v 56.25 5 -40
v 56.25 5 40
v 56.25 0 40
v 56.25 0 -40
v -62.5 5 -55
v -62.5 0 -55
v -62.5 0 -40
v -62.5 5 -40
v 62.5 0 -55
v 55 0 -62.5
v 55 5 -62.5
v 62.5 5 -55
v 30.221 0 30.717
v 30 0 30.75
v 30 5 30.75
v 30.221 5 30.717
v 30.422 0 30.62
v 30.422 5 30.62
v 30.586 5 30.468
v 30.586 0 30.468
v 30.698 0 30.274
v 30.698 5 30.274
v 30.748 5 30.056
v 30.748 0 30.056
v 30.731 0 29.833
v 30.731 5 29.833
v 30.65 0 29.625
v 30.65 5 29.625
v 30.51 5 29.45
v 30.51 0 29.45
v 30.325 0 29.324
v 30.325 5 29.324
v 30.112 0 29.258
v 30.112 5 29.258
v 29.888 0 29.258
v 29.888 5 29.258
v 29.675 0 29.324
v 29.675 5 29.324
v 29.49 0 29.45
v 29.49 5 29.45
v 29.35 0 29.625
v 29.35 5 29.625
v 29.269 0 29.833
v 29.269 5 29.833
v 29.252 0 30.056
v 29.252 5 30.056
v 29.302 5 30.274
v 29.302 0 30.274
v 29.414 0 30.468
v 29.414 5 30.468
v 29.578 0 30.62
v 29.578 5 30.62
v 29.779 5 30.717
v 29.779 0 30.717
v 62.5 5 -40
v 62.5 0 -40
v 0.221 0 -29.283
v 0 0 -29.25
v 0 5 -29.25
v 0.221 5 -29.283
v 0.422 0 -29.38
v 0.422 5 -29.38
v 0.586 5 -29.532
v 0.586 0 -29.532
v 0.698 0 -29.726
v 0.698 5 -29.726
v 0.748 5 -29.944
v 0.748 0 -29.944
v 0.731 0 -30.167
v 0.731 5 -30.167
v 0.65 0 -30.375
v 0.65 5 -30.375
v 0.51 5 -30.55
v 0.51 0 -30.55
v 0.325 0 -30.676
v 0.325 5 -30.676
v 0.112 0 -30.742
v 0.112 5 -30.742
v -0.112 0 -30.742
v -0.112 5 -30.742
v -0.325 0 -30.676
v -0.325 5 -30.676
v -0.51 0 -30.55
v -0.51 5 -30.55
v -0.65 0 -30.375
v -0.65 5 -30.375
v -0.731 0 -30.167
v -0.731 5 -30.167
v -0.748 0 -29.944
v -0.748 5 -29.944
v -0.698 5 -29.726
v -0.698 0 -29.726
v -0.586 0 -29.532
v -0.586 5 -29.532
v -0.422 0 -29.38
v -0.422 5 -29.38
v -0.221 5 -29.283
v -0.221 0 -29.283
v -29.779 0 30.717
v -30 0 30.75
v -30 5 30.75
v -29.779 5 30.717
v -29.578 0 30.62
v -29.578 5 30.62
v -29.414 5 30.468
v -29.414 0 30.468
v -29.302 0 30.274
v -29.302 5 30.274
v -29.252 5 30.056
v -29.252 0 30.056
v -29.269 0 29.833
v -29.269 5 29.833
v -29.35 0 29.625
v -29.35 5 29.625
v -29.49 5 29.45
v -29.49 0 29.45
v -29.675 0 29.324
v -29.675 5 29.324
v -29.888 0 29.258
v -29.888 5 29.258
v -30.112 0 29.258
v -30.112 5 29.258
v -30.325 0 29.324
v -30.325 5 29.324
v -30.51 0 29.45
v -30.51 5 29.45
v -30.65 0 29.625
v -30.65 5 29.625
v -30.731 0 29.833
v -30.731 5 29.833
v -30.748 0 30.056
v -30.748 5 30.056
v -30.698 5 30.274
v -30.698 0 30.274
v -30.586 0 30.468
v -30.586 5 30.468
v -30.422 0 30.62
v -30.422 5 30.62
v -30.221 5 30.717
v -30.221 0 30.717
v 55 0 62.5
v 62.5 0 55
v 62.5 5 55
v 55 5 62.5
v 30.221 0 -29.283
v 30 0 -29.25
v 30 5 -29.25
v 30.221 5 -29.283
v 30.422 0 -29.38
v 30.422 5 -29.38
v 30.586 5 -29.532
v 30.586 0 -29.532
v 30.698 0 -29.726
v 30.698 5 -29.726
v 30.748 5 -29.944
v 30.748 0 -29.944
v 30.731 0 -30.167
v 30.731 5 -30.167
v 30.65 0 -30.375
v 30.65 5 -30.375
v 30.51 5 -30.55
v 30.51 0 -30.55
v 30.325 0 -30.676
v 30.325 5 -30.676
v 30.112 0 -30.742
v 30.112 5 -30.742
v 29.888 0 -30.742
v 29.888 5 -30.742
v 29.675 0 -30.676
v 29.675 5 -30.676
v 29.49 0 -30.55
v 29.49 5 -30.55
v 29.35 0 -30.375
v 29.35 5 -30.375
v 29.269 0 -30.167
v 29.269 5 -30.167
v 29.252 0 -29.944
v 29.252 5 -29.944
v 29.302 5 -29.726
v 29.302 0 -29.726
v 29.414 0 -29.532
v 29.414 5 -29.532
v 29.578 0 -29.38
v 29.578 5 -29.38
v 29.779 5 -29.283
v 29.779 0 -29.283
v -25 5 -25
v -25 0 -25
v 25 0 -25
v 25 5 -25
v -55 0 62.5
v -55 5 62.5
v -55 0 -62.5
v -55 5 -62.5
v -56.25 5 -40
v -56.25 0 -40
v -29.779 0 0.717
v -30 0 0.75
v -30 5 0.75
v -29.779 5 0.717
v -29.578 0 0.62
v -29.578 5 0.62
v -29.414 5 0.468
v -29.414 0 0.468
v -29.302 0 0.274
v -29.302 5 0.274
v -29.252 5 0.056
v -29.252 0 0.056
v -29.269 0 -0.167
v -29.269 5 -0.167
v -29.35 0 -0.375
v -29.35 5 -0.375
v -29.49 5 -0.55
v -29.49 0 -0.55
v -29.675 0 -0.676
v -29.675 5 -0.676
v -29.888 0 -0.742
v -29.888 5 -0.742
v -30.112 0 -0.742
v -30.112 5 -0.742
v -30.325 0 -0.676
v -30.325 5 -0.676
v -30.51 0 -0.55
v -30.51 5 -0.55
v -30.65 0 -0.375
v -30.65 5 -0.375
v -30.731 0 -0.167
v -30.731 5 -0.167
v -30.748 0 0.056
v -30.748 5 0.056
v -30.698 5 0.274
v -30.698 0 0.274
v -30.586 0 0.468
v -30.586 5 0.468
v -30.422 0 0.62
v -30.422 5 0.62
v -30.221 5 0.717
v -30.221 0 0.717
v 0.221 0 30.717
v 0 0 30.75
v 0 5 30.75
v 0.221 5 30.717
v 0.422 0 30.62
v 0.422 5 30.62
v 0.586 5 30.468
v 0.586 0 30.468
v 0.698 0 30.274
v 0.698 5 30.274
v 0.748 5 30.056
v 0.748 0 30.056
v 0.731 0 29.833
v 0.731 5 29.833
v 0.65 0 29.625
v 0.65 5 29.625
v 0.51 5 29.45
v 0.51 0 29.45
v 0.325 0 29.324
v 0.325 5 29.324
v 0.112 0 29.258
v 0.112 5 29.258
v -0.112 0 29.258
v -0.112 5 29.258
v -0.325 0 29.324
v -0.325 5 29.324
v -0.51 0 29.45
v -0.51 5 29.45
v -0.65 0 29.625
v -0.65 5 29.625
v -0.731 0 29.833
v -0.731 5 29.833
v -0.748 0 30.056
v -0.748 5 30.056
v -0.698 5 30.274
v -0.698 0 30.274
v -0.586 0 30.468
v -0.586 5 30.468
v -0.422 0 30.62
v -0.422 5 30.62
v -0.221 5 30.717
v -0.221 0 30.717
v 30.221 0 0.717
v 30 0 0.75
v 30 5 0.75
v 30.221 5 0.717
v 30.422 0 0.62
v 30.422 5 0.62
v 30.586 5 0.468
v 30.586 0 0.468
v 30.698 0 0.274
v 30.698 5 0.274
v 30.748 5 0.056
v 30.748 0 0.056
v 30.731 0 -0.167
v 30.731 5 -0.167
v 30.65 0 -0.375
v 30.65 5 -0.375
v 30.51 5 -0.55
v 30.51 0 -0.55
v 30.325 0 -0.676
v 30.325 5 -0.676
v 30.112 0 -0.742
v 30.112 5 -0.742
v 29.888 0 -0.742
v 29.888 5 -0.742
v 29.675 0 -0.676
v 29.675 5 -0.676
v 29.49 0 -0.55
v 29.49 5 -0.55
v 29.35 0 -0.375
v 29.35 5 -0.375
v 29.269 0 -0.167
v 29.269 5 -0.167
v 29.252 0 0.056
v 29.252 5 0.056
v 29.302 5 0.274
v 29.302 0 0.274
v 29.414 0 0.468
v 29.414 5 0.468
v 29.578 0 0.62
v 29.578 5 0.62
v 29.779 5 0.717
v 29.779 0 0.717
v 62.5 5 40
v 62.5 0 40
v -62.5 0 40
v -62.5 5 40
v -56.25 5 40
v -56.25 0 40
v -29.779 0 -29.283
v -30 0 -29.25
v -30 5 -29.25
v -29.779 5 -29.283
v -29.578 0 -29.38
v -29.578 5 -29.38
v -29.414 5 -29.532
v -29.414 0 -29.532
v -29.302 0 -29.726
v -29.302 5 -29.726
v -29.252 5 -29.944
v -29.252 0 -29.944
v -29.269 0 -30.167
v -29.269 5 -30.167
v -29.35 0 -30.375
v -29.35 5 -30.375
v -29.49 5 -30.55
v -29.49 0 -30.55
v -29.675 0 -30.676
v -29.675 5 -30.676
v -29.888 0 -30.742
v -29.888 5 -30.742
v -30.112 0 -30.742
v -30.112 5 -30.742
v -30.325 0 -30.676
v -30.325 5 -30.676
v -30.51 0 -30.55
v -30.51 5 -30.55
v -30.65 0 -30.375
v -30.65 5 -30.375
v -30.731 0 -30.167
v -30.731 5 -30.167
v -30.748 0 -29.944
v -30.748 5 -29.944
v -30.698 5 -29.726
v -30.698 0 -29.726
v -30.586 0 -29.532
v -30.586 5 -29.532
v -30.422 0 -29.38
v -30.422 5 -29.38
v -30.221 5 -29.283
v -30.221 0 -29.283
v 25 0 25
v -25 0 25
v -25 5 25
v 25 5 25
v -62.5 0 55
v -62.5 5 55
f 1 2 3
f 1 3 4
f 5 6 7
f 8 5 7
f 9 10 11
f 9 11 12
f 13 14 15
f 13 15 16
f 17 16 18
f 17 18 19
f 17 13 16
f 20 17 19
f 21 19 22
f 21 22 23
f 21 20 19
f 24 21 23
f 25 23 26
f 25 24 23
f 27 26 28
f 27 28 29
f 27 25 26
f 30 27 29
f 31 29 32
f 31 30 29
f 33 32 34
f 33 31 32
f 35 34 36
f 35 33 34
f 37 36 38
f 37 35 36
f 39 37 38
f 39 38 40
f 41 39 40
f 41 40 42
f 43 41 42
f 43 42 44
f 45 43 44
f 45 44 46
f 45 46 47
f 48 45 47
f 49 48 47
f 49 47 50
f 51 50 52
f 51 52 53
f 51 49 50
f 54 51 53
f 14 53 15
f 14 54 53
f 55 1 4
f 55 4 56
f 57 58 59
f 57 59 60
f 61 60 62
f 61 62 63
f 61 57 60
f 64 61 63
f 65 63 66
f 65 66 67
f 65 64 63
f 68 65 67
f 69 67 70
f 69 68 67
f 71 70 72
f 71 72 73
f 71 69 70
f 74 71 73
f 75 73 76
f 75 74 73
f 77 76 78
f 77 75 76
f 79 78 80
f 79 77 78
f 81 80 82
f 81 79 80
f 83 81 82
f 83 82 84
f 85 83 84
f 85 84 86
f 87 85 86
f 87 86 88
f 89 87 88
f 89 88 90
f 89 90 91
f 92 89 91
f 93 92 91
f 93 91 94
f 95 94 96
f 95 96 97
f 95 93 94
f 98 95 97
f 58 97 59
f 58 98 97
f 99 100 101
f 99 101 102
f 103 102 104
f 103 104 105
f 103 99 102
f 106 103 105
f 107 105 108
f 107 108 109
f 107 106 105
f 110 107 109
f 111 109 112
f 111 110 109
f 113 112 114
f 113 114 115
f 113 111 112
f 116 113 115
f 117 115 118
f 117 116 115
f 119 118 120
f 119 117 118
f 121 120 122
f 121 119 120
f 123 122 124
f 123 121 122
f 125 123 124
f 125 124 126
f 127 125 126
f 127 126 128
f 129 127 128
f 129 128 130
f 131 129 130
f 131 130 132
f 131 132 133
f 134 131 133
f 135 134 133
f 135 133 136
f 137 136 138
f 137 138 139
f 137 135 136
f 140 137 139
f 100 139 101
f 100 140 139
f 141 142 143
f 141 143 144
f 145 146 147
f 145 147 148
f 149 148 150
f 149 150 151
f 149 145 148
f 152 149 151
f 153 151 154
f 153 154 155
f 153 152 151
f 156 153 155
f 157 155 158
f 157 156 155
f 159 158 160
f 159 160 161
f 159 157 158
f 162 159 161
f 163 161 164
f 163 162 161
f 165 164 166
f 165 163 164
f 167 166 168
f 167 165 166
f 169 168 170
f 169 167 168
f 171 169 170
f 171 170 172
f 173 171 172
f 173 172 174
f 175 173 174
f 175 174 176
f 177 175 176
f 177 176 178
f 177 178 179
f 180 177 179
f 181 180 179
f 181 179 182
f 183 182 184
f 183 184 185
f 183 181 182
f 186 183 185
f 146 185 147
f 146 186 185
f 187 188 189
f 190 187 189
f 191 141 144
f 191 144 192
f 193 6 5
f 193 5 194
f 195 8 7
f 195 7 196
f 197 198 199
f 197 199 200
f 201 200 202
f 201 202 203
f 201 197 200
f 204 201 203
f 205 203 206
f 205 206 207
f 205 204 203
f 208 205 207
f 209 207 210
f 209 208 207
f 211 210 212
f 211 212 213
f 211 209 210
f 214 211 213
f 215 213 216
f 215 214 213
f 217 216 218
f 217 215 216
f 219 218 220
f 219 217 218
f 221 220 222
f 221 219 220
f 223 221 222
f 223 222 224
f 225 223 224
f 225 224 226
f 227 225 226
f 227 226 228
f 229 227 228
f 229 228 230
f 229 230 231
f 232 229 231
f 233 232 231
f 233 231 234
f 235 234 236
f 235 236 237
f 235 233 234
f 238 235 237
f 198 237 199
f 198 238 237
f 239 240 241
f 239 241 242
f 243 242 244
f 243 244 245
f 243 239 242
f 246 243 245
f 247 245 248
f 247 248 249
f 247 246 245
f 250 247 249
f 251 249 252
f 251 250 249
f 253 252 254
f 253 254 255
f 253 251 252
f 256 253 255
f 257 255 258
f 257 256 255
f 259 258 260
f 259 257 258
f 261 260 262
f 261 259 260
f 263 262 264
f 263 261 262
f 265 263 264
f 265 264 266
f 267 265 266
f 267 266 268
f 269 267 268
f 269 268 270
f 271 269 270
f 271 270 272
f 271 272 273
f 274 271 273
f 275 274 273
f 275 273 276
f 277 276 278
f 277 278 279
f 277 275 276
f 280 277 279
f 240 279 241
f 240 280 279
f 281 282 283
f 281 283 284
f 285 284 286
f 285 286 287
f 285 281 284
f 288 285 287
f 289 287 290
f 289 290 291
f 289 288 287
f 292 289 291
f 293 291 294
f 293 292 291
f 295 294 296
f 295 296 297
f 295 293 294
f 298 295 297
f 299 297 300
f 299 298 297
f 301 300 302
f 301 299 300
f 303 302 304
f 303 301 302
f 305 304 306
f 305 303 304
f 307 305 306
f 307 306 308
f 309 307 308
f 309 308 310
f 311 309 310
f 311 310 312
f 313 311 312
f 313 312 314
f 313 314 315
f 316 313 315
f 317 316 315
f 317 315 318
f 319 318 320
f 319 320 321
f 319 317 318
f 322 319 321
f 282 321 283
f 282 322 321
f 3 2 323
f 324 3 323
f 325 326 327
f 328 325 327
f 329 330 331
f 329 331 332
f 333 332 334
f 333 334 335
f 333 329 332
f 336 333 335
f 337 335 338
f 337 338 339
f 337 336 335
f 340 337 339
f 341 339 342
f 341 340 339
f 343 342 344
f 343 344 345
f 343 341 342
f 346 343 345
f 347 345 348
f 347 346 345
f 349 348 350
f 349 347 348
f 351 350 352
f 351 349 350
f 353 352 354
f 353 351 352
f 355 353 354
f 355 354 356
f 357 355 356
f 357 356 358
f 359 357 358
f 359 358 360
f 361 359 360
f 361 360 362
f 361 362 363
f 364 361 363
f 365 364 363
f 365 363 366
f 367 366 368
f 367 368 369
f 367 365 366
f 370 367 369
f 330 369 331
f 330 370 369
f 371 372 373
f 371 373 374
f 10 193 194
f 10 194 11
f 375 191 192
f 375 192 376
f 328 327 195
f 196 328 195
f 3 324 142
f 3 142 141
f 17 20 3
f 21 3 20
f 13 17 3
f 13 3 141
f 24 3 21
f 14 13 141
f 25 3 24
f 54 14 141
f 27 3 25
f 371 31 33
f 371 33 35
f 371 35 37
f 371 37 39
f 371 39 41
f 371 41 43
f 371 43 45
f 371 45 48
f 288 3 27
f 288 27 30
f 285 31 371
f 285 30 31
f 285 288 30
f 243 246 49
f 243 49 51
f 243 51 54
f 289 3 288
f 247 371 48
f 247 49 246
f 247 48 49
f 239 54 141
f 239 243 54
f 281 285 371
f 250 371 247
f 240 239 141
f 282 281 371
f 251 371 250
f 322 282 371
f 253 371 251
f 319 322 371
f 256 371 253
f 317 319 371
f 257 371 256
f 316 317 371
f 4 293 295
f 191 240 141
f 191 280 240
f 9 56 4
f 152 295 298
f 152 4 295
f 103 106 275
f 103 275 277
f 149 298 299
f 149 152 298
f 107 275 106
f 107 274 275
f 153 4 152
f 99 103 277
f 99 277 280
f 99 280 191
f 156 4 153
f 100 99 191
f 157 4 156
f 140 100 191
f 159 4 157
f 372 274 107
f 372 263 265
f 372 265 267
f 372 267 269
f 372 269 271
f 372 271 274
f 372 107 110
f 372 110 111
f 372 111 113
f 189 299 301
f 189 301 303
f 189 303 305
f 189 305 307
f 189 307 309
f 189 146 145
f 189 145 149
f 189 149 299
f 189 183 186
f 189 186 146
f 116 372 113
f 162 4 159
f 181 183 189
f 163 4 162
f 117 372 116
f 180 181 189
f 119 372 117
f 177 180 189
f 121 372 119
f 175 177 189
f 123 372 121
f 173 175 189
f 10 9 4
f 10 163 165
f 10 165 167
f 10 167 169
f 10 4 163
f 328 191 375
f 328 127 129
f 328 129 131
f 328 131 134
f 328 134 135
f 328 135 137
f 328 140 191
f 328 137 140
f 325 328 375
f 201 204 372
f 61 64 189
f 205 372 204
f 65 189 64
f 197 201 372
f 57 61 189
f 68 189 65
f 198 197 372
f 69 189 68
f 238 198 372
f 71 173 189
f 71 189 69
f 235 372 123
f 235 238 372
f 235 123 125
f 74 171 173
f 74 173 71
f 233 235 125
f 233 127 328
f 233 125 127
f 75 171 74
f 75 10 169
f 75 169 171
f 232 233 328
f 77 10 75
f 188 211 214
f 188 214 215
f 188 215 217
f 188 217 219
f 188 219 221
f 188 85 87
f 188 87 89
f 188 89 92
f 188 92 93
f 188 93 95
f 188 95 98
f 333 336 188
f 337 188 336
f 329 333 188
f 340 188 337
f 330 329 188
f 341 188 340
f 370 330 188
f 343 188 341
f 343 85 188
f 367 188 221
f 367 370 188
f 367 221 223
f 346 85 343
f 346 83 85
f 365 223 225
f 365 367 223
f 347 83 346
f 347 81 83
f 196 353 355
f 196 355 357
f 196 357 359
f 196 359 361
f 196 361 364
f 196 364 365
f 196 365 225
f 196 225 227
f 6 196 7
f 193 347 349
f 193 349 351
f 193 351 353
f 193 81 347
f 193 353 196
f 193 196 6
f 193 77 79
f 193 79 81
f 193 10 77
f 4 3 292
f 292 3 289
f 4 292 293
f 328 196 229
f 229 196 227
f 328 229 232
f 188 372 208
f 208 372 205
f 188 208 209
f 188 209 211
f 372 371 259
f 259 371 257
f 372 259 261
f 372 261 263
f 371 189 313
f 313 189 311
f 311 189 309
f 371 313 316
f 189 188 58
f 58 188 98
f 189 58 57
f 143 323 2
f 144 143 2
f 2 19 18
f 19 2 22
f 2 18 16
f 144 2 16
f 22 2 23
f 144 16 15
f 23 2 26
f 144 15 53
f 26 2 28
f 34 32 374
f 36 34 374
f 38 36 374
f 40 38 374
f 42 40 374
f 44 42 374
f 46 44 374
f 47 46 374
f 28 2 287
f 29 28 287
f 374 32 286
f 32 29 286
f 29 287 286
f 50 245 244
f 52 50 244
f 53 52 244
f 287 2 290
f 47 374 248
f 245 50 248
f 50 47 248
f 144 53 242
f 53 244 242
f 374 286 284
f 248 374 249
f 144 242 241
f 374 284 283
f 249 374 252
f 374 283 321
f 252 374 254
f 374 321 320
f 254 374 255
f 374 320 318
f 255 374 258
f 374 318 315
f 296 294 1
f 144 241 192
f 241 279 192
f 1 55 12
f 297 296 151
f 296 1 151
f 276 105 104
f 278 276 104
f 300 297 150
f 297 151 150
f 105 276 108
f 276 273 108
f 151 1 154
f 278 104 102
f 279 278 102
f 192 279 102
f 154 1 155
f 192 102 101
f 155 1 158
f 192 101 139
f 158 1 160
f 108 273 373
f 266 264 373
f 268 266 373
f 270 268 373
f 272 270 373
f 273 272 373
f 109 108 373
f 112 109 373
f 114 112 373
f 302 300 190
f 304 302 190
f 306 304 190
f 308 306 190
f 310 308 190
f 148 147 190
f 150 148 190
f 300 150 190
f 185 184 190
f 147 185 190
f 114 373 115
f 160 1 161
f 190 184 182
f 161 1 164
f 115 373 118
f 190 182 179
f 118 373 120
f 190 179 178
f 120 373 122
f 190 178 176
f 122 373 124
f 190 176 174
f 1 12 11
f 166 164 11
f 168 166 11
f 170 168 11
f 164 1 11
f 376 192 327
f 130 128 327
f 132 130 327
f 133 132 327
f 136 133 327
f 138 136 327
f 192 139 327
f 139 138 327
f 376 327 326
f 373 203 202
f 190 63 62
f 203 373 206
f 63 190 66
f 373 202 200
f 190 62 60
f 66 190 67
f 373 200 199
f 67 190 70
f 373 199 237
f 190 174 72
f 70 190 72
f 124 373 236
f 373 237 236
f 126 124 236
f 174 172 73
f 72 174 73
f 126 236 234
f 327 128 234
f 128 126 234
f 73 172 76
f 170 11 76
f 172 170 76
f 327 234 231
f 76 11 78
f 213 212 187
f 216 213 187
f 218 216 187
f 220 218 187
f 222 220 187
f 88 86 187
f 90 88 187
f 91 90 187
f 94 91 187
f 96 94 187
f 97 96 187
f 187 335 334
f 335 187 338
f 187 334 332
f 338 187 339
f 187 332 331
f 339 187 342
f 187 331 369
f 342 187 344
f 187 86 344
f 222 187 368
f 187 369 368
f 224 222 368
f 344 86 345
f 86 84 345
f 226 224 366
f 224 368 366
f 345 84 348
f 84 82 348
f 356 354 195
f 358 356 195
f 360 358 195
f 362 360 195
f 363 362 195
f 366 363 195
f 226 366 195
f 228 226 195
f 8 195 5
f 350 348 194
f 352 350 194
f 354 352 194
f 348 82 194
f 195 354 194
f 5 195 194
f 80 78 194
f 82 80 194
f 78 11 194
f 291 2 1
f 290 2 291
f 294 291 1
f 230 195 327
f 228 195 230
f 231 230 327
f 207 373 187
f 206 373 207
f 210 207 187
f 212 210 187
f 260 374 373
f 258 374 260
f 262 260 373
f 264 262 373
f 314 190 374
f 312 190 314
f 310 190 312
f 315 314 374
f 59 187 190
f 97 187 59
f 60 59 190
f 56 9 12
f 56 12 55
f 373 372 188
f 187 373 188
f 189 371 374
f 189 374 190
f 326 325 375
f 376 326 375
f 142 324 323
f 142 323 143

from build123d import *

# Parameters (mm, degrees)
CROQUIS2_R              = 0.75
CROQUIS2_W              = 50
CROQUIS2_H              = 50
SALIENTE_EXTRUIR1_DEPTH = 5
CROQUIS3_W              = 6.25
CROQUIS3_H              = 80
CORTAR_EXTRUIR1_DEPTH   = 5


with BuildPart() as part:
    # Croquis2 → Saliente-Extruir1 (new body)
    with BuildSketch(Plane(origin=(0, 0, 0), x_dir=(1, 0, 0), z_dir=(0, 1, 0))):
        Polygon((-62.5, 0), (-62.5, 55), (-55, 62.5), (55, 62.5), (62.5, 55), (62.5, -55), (55, -62.5), (-55, -62.5), (-62.5, -55), align=None)
        with Locations(Location((30, 30, 0), (0, 0, 270))):
            Circle(CROQUIS2_R, mode=Mode.SUBTRACT)
        with Locations(Location((30, 0, 0), (0, 0, 270))):
            Circle(CROQUIS2_R, mode=Mode.SUBTRACT)
        with Locations(Location((30, -30, 0), (0, 0, 270))):
            Circle(CROQUIS2_R, mode=Mode.SUBTRACT)
        with Locations(Location((-30, -30, 0), (0, 0, 270))):
            Circle(CROQUIS2_R, mode=Mode.SUBTRACT)
        with Locations(Location((0, -30, 0), (0, 0, 270))):
            Circle(CROQUIS2_R, mode=Mode.SUBTRACT)
        with Locations(Location((-30, 0, 0), (0, 0, 270))):
            Circle(CROQUIS2_R, mode=Mode.SUBTRACT)
        with Locations(Location((-30, 30, 0), (0, 0, 270))):
            Circle(CROQUIS2_R, mode=Mode.SUBTRACT)
        with Locations(Location((0, 30, 0), (0, 0, 270))):
            Circle(CROQUIS2_R, mode=Mode.SUBTRACT)
        Rectangle(CROQUIS2_W, CROQUIS2_H, mode=Mode.SUBTRACT)
    extrude(amount=SALIENTE_EXTRUIR1_DEPTH)

    # Croquis3 → Cortar-Extruir1 (cut)
    with BuildSketch(Plane(origin=(0, 5, 0), x_dir=(1, 0, 0), z_dir=(0, 1, 0))):
        with Locations((59.375, 0)):
            Rectangle(CROQUIS3_W, CROQUIS3_H)
        with Locations((-59.375, 0)):
            Rectangle(CROQUIS3_W, CROQUIS3_H)
    extrude(amount=-CORTAR_EXTRUIR1_DEPTH, mode=Mode.SUBTRACT)


solid = part.part
